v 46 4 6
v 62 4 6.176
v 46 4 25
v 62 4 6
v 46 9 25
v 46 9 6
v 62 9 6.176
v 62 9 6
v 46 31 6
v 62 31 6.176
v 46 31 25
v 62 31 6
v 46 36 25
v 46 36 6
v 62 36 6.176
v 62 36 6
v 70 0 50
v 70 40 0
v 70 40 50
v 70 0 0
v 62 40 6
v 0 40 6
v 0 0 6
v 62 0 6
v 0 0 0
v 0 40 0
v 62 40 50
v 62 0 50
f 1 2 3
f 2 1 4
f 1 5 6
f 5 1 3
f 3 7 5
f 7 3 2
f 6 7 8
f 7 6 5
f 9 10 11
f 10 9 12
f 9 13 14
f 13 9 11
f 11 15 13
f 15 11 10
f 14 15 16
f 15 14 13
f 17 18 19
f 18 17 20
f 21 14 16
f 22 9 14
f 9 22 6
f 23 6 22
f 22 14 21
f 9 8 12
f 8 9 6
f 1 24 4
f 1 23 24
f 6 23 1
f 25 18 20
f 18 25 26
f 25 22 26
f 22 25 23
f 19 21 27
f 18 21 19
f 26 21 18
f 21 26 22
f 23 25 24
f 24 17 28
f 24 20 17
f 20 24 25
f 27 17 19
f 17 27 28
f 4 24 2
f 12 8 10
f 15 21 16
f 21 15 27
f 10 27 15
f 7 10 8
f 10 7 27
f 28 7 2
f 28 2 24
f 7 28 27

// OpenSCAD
$fn = 32;

// ----------------------------------------------------------------------
// Rib bracket: 2-gusset L bracket
// ----------------------------------------------------------------------

// --- parameters (mm) ---
base_l = 70;              // foot length, X
base_w = 40;              // foot width, Y
base_t = 6;               // foot thickness
plate_t = 8;              // upright plate thickness
plate_h = 50;             // overall height
gus_l = 16;               // gusset leg along the foot
gus_h = 20;               // gusset height
gus_t = 5;                // gusset thickness
gus_edge = 4;             // gusset margin from the foot edge
n_gus = 2;                // gusset count

gus_pitch = (base_w - 2 * gus_edge - gus_t) / (n_gus - 1);  // gusset pitch

union() {
  cube([base_l, base_w, base_t]);
  translate([base_l - plate_t, 0, base_t - 1])
    cube([plate_t, base_w, plate_h - base_t + 1]);
  for (i = [0 : n_gus - 1])
    translate([base_l - plate_t - gus_l, gus_edge + i * gus_pitch, base_t - 1])
      rotate([-90, 0, 0])
        linear_extrude(height = gus_t)
          polygon(points = [[0, 0], [gus_l + 1, 0], [0, -gus_h]]);
}
